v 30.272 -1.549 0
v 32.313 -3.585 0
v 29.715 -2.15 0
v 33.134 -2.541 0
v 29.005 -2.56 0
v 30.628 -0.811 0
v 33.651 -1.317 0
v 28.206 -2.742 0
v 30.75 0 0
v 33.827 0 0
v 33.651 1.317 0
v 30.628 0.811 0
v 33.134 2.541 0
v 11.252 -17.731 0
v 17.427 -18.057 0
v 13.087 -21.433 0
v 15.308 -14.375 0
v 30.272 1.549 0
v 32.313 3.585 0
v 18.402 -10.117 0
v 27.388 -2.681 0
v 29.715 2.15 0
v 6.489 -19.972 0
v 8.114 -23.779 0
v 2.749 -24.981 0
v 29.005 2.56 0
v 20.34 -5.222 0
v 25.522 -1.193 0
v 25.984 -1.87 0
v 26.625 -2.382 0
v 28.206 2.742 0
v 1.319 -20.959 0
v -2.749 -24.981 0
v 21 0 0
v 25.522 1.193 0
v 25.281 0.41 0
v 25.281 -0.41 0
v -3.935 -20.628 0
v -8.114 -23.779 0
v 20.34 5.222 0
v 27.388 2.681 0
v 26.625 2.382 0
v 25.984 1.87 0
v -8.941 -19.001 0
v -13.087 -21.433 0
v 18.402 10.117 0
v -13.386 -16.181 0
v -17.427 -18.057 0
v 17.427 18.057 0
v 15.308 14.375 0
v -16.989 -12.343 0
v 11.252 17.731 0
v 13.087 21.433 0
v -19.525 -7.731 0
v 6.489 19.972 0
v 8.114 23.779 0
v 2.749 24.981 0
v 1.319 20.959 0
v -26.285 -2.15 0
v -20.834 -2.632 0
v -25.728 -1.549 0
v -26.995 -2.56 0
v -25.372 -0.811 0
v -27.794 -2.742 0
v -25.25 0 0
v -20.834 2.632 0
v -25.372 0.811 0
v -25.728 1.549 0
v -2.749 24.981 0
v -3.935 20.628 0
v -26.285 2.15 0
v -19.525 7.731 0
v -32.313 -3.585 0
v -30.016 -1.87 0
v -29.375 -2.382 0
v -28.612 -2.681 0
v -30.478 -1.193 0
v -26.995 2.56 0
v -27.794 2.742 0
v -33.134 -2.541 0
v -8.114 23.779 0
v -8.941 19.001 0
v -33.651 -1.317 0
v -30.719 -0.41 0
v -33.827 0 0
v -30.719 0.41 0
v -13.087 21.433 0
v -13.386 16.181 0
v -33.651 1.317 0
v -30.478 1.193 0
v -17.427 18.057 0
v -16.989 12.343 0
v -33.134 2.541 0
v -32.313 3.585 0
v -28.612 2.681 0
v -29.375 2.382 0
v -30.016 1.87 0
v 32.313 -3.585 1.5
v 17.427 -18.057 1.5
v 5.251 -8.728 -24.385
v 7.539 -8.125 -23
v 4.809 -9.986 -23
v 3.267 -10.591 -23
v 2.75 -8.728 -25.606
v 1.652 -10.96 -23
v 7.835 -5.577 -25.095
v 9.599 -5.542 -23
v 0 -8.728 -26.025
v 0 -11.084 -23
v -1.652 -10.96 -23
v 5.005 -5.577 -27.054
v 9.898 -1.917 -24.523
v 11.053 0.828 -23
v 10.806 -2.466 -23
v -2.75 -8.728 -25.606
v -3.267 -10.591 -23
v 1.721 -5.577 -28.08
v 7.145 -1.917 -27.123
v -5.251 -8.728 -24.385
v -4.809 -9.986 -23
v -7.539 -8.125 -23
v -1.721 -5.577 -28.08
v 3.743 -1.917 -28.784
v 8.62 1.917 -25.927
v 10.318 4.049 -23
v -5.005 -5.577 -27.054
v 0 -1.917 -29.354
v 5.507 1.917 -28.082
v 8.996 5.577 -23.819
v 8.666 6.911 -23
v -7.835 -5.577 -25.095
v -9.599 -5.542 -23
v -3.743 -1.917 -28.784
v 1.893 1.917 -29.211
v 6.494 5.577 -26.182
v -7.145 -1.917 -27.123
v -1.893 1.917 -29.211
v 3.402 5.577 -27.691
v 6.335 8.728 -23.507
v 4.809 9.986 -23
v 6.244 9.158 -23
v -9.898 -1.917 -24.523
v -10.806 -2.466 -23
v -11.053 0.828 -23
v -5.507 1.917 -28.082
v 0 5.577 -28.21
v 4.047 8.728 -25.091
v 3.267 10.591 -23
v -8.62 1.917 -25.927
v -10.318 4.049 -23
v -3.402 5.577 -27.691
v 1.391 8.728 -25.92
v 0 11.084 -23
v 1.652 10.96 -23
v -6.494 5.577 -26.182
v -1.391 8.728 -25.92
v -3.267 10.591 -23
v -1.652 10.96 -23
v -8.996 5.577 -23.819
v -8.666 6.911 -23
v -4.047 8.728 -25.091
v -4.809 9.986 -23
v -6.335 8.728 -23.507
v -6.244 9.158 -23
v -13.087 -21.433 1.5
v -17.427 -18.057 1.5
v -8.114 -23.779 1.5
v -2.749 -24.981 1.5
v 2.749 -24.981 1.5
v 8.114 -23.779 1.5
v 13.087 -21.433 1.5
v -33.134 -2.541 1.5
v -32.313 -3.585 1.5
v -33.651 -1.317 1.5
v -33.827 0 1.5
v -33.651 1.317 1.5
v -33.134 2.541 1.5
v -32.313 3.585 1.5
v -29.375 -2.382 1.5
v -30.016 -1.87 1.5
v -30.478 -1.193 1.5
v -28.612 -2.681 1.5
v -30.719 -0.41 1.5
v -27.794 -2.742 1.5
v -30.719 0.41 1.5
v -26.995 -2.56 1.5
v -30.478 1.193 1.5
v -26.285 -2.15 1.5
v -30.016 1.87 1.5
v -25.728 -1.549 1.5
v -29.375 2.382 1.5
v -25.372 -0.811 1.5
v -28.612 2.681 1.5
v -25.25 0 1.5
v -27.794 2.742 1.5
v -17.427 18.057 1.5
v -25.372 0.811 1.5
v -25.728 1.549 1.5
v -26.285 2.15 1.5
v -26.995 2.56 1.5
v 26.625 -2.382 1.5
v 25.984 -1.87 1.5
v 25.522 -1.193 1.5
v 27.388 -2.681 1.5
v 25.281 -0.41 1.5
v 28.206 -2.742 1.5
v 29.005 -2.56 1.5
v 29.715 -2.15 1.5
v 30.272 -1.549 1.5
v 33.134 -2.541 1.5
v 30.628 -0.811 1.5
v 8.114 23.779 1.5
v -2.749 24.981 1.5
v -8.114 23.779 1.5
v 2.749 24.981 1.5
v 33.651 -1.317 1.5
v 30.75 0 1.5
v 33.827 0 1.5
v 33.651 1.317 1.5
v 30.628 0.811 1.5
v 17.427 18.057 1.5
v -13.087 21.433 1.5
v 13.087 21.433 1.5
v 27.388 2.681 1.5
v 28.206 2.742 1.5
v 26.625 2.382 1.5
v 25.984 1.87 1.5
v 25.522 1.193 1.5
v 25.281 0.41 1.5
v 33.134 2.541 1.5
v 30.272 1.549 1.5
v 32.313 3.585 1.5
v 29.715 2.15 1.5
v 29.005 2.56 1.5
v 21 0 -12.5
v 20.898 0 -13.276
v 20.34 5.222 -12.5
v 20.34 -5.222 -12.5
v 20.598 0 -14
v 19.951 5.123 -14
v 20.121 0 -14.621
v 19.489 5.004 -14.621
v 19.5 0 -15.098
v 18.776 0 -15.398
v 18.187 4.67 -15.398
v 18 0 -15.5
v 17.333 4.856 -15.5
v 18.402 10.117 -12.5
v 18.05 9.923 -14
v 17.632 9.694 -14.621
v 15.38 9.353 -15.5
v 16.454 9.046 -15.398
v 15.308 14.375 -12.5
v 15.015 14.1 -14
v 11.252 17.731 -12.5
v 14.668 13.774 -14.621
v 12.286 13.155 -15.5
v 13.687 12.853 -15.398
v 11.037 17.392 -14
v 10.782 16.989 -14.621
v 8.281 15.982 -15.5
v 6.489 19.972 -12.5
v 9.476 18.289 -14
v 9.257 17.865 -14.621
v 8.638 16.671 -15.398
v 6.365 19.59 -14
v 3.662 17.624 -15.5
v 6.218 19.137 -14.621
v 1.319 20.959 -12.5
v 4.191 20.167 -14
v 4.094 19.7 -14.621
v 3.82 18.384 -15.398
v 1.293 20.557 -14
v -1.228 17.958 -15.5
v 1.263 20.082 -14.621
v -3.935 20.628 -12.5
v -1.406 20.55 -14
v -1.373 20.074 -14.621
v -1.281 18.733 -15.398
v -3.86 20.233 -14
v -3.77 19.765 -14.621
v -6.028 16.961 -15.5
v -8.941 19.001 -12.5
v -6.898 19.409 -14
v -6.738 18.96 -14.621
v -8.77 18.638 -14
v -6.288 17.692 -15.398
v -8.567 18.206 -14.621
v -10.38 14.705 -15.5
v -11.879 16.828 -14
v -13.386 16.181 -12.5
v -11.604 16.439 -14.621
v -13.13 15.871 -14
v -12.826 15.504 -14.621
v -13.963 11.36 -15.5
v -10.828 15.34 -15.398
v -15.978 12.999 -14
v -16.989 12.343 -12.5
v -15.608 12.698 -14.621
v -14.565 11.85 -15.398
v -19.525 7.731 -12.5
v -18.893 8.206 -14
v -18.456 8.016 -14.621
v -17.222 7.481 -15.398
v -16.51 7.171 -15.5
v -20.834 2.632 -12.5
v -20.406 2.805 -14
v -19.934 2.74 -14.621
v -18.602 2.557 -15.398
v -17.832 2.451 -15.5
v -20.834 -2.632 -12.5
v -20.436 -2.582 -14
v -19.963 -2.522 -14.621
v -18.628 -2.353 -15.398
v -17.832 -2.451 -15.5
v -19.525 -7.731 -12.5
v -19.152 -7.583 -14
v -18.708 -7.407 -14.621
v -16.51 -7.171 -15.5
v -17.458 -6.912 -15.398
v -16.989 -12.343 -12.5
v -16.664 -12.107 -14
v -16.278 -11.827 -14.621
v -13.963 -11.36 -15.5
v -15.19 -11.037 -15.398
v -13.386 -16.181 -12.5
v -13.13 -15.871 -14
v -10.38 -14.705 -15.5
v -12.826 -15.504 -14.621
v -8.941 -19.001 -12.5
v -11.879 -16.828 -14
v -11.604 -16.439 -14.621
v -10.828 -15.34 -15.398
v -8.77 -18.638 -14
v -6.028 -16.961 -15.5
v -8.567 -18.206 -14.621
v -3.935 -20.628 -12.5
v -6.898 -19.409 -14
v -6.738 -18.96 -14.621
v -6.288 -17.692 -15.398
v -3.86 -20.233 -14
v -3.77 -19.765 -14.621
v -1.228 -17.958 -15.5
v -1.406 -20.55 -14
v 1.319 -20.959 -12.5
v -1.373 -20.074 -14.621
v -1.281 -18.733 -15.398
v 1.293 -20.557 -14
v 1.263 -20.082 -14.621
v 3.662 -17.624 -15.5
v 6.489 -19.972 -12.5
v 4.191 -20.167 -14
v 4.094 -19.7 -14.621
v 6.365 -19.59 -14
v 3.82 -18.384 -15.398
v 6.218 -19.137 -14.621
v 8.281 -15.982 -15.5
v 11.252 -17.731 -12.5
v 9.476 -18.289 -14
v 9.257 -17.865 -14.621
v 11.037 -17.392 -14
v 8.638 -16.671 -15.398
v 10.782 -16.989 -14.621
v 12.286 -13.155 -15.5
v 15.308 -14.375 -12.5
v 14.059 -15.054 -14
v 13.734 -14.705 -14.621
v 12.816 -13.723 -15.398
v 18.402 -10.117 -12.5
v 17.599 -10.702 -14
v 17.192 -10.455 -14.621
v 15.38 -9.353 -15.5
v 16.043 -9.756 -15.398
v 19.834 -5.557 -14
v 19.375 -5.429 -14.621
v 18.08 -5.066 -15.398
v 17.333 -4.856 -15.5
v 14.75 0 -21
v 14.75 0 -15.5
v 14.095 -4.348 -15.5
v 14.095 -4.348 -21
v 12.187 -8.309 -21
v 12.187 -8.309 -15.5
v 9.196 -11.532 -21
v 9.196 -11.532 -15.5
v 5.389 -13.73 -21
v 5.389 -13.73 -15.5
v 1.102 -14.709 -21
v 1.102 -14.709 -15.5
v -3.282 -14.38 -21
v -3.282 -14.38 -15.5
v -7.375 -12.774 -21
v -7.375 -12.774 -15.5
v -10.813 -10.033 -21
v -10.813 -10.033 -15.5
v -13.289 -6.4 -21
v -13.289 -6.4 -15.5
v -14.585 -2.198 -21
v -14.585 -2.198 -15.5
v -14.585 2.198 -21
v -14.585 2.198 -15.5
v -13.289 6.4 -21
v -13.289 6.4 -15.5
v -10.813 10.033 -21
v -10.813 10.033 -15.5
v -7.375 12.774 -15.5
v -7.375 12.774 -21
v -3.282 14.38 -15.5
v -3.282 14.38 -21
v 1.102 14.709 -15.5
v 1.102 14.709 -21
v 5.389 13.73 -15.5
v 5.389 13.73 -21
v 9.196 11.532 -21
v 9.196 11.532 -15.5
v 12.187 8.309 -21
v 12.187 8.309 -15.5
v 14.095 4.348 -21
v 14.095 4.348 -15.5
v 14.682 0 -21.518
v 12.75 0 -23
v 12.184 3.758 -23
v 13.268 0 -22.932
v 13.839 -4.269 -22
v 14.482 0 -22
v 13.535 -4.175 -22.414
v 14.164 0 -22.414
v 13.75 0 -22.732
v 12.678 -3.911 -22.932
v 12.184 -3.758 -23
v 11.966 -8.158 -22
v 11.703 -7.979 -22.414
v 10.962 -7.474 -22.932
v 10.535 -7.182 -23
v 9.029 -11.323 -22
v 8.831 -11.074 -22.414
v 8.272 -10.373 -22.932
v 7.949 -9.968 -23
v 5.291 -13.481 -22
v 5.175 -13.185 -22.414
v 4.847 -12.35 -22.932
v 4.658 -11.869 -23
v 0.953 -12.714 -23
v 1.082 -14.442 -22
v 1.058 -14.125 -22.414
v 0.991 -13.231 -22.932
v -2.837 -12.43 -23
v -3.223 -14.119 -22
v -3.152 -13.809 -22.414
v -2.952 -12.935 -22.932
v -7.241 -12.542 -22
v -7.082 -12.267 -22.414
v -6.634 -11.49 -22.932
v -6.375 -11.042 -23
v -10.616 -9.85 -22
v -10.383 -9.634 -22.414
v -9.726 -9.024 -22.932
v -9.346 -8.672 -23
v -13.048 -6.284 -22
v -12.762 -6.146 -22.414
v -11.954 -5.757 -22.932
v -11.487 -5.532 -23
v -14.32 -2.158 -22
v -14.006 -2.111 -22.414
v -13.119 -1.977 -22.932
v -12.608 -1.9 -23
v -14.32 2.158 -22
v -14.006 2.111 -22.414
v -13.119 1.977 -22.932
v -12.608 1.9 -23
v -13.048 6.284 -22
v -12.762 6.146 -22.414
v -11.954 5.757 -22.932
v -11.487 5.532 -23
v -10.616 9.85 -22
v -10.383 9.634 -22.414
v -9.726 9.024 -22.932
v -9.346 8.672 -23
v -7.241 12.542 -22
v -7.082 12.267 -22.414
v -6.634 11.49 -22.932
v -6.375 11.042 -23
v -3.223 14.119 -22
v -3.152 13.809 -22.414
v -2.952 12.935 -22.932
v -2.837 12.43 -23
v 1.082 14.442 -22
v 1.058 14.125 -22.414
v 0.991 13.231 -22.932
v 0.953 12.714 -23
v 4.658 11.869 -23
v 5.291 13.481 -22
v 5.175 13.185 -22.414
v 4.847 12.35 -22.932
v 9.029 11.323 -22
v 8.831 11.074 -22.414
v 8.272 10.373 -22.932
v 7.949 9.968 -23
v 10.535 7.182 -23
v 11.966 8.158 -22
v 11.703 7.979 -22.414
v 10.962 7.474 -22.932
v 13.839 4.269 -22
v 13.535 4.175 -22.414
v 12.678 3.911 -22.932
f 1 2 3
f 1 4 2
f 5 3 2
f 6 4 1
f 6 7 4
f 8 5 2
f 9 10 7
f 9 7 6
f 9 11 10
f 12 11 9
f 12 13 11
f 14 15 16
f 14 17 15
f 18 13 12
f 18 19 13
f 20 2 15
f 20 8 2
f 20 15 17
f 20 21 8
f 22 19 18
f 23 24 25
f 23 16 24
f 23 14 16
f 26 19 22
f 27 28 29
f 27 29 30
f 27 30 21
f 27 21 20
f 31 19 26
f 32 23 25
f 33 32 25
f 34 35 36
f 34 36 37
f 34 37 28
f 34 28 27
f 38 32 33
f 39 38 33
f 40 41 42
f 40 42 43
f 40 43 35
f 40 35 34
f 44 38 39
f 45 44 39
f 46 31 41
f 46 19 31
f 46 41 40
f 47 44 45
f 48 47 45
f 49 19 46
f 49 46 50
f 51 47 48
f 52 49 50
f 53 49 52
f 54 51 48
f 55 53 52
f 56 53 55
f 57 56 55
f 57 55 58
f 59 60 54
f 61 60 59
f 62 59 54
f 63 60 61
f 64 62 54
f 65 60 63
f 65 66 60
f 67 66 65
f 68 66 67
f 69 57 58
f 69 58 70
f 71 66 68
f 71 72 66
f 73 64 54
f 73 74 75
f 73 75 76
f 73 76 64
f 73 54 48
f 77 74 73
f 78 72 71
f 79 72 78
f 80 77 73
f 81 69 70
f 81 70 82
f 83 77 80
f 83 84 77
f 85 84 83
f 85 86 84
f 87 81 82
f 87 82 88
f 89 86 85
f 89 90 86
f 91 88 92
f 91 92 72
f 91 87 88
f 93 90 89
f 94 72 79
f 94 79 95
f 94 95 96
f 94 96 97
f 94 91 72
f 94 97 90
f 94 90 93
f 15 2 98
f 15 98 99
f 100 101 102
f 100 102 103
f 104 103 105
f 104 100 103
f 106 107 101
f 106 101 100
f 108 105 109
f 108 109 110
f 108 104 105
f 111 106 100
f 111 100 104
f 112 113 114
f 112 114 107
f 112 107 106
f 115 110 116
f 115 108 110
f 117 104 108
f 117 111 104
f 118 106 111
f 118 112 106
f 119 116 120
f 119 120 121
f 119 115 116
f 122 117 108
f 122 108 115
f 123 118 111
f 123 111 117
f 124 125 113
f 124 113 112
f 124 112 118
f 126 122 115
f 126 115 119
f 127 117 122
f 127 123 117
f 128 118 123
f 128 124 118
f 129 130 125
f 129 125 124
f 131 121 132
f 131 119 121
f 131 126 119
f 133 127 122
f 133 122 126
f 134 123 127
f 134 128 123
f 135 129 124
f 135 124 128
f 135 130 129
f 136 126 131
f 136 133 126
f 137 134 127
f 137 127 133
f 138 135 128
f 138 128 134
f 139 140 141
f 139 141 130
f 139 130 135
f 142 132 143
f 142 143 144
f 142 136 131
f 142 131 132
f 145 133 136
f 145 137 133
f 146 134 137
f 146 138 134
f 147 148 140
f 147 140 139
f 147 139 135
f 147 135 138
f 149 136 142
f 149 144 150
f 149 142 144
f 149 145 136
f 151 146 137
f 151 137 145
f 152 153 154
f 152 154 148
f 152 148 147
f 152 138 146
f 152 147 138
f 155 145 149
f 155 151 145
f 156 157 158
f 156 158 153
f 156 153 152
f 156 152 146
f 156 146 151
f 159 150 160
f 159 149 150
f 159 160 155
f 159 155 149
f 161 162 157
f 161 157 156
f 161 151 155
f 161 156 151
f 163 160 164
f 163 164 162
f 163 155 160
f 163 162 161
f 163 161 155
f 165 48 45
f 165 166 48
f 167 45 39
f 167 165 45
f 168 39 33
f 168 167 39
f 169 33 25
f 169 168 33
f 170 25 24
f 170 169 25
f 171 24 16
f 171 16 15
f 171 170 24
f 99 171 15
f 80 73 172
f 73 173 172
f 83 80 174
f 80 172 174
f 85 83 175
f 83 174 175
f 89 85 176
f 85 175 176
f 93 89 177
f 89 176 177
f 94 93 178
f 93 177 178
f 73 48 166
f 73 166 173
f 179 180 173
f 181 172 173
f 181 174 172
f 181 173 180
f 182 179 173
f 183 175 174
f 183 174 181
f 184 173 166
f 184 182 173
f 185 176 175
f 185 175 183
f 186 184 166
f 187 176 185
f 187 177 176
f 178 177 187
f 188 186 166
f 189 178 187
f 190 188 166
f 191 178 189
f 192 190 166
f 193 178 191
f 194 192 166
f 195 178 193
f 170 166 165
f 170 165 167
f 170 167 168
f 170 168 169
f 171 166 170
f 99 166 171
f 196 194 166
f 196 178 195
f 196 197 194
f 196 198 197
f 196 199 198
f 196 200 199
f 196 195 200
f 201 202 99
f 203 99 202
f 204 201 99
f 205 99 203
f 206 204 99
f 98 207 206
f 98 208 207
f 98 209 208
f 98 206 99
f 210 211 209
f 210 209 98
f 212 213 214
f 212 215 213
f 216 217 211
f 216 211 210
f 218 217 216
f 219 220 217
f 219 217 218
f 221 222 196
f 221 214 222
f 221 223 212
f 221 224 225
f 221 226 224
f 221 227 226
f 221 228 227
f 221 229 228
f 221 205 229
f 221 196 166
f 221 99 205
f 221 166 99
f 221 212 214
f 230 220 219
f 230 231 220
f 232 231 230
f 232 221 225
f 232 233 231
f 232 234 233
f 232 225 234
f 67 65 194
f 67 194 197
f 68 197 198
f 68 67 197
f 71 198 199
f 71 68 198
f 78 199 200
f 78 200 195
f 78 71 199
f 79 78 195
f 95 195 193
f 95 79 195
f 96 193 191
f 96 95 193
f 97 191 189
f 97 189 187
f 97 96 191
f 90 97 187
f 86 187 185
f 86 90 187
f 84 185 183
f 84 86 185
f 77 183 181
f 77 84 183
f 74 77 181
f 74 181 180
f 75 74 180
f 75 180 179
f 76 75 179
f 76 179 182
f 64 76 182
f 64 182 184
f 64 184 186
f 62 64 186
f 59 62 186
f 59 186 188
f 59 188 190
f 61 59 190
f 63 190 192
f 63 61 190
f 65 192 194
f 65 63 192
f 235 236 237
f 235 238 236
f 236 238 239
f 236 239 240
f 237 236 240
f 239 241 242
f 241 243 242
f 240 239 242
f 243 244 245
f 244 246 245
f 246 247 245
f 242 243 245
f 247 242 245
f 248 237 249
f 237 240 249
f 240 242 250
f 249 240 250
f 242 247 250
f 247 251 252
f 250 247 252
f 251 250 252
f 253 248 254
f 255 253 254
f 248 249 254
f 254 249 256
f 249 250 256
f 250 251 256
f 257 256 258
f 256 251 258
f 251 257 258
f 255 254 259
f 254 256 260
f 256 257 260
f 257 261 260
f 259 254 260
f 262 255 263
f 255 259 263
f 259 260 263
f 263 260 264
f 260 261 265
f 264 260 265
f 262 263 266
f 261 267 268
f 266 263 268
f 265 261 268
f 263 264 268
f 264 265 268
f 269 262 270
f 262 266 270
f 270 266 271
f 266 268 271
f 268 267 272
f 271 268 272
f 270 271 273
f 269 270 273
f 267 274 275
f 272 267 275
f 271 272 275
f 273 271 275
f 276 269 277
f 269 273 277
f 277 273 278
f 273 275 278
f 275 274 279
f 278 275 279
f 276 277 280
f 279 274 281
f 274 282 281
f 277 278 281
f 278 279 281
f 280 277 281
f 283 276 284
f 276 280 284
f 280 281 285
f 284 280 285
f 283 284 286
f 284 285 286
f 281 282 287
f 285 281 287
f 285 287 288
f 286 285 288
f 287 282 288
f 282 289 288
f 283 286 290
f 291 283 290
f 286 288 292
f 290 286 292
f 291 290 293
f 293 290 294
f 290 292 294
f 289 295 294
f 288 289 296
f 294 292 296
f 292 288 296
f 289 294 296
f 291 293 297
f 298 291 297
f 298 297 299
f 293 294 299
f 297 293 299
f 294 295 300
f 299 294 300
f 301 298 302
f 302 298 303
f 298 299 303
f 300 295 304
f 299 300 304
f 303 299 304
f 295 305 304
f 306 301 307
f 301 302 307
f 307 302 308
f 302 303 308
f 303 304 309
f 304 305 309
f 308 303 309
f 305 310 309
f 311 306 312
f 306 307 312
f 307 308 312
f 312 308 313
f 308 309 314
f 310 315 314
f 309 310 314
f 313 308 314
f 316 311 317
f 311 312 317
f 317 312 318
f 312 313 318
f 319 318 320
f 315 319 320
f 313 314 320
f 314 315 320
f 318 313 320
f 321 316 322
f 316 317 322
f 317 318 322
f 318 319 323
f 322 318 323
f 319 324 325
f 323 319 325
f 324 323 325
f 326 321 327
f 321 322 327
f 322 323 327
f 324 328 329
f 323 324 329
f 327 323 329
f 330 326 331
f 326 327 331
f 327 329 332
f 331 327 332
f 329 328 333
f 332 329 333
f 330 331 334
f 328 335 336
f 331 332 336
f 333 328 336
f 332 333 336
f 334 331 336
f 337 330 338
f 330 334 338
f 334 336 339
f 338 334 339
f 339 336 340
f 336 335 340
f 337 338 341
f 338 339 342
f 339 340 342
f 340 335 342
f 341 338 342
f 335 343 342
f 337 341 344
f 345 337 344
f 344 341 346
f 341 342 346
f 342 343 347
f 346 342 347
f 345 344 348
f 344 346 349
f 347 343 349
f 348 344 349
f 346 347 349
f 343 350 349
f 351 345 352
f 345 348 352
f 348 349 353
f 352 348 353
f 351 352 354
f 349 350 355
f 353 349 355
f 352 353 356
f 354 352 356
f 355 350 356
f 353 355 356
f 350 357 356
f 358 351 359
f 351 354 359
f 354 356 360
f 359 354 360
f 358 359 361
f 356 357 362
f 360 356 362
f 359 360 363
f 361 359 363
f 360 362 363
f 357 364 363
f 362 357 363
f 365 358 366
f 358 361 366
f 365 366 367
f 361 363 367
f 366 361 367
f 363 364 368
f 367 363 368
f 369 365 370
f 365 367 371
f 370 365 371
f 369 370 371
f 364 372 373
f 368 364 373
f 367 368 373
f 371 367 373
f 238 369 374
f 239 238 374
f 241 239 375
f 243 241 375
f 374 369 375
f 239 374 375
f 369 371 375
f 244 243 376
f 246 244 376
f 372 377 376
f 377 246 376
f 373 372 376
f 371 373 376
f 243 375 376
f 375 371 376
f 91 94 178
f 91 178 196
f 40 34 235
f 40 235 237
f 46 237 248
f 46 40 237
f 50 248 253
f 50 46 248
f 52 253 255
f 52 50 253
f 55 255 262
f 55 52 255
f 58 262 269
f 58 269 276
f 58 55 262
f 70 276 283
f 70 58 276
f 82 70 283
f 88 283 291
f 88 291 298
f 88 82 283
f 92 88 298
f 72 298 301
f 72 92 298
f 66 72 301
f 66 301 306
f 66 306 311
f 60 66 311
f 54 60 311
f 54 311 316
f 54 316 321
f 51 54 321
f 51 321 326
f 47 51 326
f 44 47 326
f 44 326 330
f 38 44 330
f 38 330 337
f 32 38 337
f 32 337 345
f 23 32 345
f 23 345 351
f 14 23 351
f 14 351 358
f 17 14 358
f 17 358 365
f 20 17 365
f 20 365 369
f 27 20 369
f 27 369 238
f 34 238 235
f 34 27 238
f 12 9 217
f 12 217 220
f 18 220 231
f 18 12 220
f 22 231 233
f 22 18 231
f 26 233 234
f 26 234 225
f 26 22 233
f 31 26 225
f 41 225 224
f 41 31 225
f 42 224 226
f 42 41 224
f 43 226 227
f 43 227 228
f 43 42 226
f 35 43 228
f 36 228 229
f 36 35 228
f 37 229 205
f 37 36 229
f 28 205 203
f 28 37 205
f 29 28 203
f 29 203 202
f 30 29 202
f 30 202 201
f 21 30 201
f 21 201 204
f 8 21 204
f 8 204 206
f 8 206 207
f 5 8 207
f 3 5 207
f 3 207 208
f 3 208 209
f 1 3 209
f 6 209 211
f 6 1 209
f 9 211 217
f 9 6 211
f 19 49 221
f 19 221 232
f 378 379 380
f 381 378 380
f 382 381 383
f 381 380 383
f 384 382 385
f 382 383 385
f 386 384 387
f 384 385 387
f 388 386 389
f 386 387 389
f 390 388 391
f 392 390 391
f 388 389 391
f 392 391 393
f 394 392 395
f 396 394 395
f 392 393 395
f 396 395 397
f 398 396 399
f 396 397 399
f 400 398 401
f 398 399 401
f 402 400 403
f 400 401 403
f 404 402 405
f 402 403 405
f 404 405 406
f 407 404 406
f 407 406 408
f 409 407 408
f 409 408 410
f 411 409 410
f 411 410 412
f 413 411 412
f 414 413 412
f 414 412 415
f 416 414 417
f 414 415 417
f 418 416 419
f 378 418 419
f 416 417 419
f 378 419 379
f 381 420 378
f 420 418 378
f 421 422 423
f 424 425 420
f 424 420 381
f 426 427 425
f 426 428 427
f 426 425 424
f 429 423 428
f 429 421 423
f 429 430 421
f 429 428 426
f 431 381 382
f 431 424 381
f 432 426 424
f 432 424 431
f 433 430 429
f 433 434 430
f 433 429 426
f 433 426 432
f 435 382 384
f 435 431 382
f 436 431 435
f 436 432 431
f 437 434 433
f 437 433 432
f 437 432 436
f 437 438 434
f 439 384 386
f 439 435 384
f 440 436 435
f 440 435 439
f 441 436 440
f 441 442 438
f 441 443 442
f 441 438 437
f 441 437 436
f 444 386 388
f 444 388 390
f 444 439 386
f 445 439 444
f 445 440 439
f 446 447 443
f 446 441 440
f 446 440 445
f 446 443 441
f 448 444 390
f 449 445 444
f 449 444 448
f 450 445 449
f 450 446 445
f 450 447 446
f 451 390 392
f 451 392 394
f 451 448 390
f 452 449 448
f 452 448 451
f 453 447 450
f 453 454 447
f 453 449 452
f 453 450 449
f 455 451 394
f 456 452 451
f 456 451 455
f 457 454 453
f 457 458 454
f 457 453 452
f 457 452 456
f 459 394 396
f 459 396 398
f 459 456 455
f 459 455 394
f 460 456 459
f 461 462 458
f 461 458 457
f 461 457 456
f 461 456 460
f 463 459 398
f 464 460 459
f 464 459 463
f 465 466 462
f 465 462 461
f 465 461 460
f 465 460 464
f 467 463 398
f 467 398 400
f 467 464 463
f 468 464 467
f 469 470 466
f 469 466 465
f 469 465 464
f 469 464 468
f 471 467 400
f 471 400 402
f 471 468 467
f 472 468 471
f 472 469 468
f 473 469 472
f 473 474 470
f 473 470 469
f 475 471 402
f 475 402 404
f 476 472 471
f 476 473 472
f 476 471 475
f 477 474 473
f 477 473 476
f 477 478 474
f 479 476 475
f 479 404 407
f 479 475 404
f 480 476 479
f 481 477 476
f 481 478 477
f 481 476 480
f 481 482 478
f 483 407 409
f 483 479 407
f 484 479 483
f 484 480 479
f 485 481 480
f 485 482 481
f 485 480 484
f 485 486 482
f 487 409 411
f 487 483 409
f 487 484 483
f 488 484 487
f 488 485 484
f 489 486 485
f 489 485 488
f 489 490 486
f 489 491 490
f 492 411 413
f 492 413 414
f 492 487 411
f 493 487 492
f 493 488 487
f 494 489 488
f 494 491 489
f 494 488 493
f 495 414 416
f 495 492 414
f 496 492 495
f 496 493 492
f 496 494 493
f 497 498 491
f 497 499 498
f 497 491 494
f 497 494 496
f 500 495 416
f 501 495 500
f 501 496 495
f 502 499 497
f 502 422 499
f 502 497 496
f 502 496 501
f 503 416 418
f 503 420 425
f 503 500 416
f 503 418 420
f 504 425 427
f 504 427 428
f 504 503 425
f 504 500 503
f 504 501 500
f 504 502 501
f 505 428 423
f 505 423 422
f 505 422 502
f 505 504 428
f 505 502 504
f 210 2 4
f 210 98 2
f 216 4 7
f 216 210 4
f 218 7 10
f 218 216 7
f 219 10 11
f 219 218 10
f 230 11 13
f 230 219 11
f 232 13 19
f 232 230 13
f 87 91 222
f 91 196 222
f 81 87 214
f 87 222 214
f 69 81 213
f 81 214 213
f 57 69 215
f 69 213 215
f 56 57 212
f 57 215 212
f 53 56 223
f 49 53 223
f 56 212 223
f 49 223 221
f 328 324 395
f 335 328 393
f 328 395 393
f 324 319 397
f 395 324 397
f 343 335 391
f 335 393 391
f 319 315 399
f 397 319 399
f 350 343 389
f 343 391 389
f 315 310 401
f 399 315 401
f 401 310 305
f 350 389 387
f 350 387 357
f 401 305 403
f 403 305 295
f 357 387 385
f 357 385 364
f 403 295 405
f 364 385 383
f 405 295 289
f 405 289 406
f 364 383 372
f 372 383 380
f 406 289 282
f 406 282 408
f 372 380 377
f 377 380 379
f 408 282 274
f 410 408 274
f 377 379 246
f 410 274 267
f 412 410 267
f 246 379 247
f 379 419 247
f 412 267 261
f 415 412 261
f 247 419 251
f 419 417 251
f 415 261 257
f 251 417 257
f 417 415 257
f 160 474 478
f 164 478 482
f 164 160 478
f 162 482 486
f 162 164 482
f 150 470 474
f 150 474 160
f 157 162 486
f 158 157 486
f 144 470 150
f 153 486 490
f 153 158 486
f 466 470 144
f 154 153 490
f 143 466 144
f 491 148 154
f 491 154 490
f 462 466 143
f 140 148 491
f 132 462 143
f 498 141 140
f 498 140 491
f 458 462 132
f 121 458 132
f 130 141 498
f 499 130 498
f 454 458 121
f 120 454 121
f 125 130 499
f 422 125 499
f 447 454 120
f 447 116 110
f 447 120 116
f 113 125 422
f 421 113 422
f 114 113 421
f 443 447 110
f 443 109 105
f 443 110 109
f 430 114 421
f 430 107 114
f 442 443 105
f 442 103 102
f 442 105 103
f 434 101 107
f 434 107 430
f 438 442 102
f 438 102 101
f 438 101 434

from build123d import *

# Parameters (mm, degrees)
SKETCH_2_R      = 2.75
EXTRUDE_1_DEPTH = 1.5
SKETCH_3_R      = 21
EXTRUDE_2_DEPTH = 17
FILLET_4_R      = 3
SKETCH_6_R      = 14.75
EXTRUDE_3_DEPTH = 7.5
FILLET_3_R      = 2
FILLET_7_R      = 25
FILLET_8_R      = 5


with BuildPart() as part:
    # ｽｹｯﾁ2 → ﾎﾞｽ - 押し出し1 (new body)
    with BuildSketch(Plane.XY):
        Polygon((0, -35), (-36, 0), (0, 35), (36, 0), align=None)
        with Locations((-28, 0)):
            Circle(SKETCH_2_R, mode=Mode.SUBTRACT)
        with Locations((28, 0)):
            Circle(SKETCH_2_R, mode=Mode.SUBTRACT)
    extrude(amount=EXTRUDE_1_DEPTH)

    # ｽｹｯﾁ3 → ﾎﾞｽ - 押し出し2 (add)
    with BuildSketch(Plane.XY.offset(1.5)):
        Circle(SKETCH_3_R)
    extrude(amount=-EXTRUDE_2_DEPTH)

    # ﾌｨﾚｯﾄ4
    fillet_4_edges = [part.edges().sort_by_distance(p)[0] for p in [
        (-21, 0, -15.5),
    ]]
    fillet(fillet_4_edges, radius=FILLET_4_R)

    # ｽｹｯﾁ5 → 回転1 (revolve)
    with BuildSketch(Plane(origin=(0, 0, -16.8), x_dir=(-1, 0, 0), z_dir=(0, 0, -1))):
        with BuildLine():
            Line((0, 12.7), (0, -12.7))
            ThreePointArc((0, -12.7), (-12.7, 0), (0, 12.7))
        make_face()
    revolve(axis=Axis((0, -12.7, -16.8), (0, 1, 0)))

    # ｽｹｯﾁ6 → ﾎﾞｽ - 押し出し3 (add)
    with BuildSketch(Plane(origin=(0, 0, -15.5), x_dir=(-1, 0, 0), z_dir=(0, 0, -1))):
        with Locations(Location((0, 0, 0), (0, 0, 180))):
            Circle(SKETCH_6_R)
    extrude(amount=EXTRUDE_3_DEPTH)

    # ﾌｨﾚｯﾄ3
    fillet_3_edges = [part.edges().sort_by_distance(p)[0] for p in [
        (-14.75, 0, -23),
    ]]
    fillet(fillet_3_edges, radius=FILLET_3_R)

    # ﾌｨﾚｯﾄ7
    fillet_7_edges = [part.edges().sort_by_distance(p)[0] for p in [
        (0, 35, 0.75),
        (0, -35, 0.75),
    ]]
    fillet(fillet_7_edges, radius=FILLET_7_R)

    # ﾌｨﾚｯﾄ8
    fillet_8_edges = [part.edges().sort_by_distance(p)[0] for p in [
        (36, 0, 0.75),
        (-36, 0, 0.75),
    ]]
    fillet(fillet_8_edges, radius=FILLET_8_R)


solid = part.part
